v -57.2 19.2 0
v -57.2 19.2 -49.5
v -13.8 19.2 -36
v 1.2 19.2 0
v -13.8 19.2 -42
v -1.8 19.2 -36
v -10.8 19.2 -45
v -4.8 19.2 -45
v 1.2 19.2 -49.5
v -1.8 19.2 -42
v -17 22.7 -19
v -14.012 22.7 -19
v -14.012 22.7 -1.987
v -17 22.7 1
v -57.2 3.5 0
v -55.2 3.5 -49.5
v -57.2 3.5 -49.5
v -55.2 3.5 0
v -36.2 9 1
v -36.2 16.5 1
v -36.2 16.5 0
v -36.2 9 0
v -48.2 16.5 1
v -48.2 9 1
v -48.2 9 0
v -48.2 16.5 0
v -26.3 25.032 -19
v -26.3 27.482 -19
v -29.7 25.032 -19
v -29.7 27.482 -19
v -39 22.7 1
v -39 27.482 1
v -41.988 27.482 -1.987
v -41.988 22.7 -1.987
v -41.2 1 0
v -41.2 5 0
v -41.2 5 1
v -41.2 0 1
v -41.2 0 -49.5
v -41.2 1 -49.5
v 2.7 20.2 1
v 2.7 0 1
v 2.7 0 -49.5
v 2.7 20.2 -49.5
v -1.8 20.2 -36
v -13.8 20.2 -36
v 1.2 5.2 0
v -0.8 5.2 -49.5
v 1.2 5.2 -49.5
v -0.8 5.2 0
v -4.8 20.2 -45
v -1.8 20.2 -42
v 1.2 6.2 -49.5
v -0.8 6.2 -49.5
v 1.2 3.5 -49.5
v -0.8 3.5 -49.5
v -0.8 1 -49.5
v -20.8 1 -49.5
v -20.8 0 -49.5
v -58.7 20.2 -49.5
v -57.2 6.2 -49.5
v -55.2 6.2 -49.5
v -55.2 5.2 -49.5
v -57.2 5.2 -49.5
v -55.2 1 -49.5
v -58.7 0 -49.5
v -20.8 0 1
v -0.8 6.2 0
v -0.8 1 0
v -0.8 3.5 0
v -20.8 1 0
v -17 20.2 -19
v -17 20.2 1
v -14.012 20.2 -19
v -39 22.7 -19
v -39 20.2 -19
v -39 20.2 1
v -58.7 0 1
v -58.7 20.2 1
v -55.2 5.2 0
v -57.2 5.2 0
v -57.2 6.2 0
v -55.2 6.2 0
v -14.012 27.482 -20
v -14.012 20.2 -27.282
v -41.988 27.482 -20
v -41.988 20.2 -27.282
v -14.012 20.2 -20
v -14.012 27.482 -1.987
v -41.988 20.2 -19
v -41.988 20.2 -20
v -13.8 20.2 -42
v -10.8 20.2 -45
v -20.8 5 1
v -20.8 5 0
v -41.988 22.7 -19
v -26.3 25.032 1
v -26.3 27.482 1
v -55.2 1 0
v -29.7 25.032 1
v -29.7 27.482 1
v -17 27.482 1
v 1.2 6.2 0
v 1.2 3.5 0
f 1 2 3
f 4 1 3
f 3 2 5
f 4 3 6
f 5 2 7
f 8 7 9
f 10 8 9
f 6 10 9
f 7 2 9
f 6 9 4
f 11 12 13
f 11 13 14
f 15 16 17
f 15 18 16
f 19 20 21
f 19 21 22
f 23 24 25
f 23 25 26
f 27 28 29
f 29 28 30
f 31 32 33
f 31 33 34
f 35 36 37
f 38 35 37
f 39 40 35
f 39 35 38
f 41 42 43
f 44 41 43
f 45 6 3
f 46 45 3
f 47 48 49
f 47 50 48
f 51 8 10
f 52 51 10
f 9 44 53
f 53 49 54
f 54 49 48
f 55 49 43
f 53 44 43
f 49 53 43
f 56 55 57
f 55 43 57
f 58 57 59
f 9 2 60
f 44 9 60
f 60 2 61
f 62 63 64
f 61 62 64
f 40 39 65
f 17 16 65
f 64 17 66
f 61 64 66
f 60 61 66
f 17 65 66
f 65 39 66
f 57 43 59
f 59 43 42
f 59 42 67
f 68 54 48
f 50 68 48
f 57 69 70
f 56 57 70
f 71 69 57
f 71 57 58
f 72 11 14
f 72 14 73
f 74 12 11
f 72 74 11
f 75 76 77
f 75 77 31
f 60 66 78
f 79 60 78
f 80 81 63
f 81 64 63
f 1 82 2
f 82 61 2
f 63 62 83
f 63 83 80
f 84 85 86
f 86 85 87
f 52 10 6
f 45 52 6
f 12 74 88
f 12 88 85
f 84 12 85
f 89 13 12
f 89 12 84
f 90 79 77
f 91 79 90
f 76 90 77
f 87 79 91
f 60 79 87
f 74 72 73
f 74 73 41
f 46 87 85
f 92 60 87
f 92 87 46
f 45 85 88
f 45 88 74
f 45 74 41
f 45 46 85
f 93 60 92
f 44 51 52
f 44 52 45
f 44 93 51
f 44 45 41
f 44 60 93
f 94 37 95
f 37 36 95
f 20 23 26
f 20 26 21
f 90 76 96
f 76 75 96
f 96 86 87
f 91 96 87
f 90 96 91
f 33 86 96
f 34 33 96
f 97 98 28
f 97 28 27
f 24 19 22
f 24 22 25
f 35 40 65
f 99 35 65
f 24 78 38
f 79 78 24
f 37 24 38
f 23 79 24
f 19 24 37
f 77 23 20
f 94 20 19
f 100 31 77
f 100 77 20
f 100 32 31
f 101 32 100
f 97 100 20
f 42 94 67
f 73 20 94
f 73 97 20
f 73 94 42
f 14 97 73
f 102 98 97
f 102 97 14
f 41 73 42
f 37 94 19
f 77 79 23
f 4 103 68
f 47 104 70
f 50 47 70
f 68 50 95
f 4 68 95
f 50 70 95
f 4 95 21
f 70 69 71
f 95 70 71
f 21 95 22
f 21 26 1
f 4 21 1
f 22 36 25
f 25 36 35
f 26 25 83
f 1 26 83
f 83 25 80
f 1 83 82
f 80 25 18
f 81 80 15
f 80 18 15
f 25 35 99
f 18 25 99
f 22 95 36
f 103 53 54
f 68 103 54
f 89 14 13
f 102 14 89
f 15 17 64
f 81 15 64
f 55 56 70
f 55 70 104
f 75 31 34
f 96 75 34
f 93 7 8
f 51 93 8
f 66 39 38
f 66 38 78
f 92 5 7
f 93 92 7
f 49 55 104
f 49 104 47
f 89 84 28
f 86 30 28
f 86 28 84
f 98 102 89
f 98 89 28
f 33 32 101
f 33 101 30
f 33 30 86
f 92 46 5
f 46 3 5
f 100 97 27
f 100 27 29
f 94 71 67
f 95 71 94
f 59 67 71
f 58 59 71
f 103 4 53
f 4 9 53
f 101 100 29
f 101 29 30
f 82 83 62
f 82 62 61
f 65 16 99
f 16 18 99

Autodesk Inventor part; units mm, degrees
ref_plane "YZ Plane" through (0, 0, 0) normal (1, 0, 0) x (0, 1, 0)
ref_plane "XZ Plane" through (0, 0, 0) normal (0, 1, 0) x (-1, 0, 0)
ref_plane "XY Plane" through (0, 0, 0) normal (0, 0, 1) x (1, 0, 0)
sketch "Sketch1" plane through (0, 0, 0) normal (0, 1, 0) x (-1, 0, 0)
  line L0 (0, 0) -> (56, 0)
  line L1 (56, 0) -> (56, -50)
  line L2 (56, -50) -> (0, -50)
  line L3 (0, -50) -> (0, 0)
  line L4 (56.2, 0) -> (-0.2, 0)
  line L5 (-0.2, 0) -> (-0.2, -50)
  line L6 (-0.2, -50) -> (56.2, -50)
  line L7 (56.2, -50) -> (56.2, 0)
  line L8 (58.7, 2.5) -> (-2.7, 2.5)
  line L9 (-2.7, 2.5) -> (-2.7, -52.5)
  line L10 (-2.7, -52.5) -> (58.7, -52.5)
  line L11 (58.7, -52.5) -> (58.7, 2.5)
  line L12 (56.2, -48.0985) -> (56.2, -52.5)
  line L13 (-0.2, -48.7936) -> (-0.2, -52.5)
  point P0 (-0.2, -50)
  dimension "d0" = 56
  dimension "d1" = 50
  dimension "d2" = 0.2
  dimension "d3" = 0.2
  dimension "d4" = 0
  dimension "d5" = 0
  dimension "d6" = 2.5
  dimension "d7" = 2.5
  dimension "d8" = 2.5
  dimension "d9" = 2.5
extrude "Extrusion1" add sketch "Sketch1" along normal blind 15.2 contours L4 L5 L13 L10 L9 L8 L11 L12 L7 L0
extrude "Extrusion2" add sketch "Sketch1" along normal blind 1
sketch "Sketch2" plane through (0.2, 15.2, 0) normal (0, 0, -1) x (-1, 0, 0)
  line L0 (0, -14.2) -> (0, 0) projected
  line L1 (0, -11.7) -> (56.4, -11.7)
  line L2 (56.4, -11.7) -> (56.4, -14.2)
  line L3 (56.4, -14.2) -> (0, -14.2)
  line L4 (0, -14.2) -> (0, -11.7)
  line L5 (56.4, -14.2) -> (56.4, 0) projected
  line L6 (0, -14.2) -> (56.4, -14.2) projected
  line L7 (1, -11.7) -> (55.4, -11.7)
  line L8 (55.4, -11.7) -> (55.4, -14.2)
  line L9 (55.4, -14.2) -> (1, -14.2)
  line L10 (1, -14.2) -> (1, -11.7)
  line L11 (0, -9) -> (56.4, -9)
  line L12 (56.4, -9) -> (56.4, -10)
  line L13 (56.4, -10) -> (0, -10)
  line L14 (0, -10) -> (0, -9)
  line L15 (56.4, -9) -> (55.4, -9)
  line L16 (55.4, -9) -> (55.4, -10)
  line L17 (55.4, -10) -> (56.4, -10)
  line L18 (56.4, -10) -> (56.4, -9)
  line L19 (0, -9) -> (1, -9)
  line L20 (1, -9) -> (1, -10)
  line L21 (1, -10) -> (0, -10)
  line L22 (0, -10) -> (0, -9)
  point P0 (0.2, -15.2)
  point P1 (0, -10)
  point P2 (1, -14.2)
  dimension "d14" = 0
  dimension "d16" = 2.5
  dimension "d17" = 1
  dimension "d18" = 1
  dimension "d19" = 0
  dimension "d20" = 0
  dimension "d21" = 1.7
  dimension "d22" = 1
extrude "Extrusion3" add sketch "Sketch2" along normal up to surface (52.5 mm away) contours L0 L1 L10 L3 | L0 L11 L20 L13 | L8 L1 L2 L3 | L16 L11 L5 L13
sketch "Sketch3" plane through (2.7, 0, -52.5) normal (0, 0, -1) x (-1, 0, 0)
  line L0 (2.5, 15.2) -> (58.9, 15.2) projected
  line L1 (23.5, 15.2) -> (43.9, 15.2)
  line L2 (43.9, 15.2) -> (43.9, 0)
  line L3 (43.9, 0) -> (23.5, 0)
  line L4 (23.5, 0) -> (23.5, 15.2)
  line L5 (58.9, 6.2) -> (58.9, 15.2) projected
  line L6 (2.5, 6.2) -> (2.5, 15.2) projected
  line L7 (0, 0) -> (61.4, 0) projected
  line L8 (23.5, 0) -> (43.9, 0)
  line L9 (43.9, 0) -> (43.9, 5)
  line L10 (43.9, 5) -> (23.5, 5)
  line L11 (23.5, 5) -> (23.5, 0)
  point P0 (2.7, 0)
  dimension "d25" = 15
  dimension "d26" = 21
  dimension "d27" = 0
  dimension "d30" = 5
extrude "Extrusion5" cut sketch "Sketch3" against normal blind 75.725 contours L10 L2 L3 L4
sketch "Sketch4" plane through (-58.7, 15.2, 2.5) normal (0, 0, 1) x (1, 0, 0)
  line L0 (11.5, -0.7) -> (20.5, -0.7)
  line L1 (20.5, -0.7) -> (20.5, -4.2)
  line L2 (20.5, -4.2) -> (11.5, -4.2)
  line L3 (11.5, -4.2) -> (11.5, -0.7)
  point P0 (58.7, -15.2)
  point P1 (3.5, -11.7)
  point P2 (2.5, -11.7)
  dimension "d33" = 7.5
  dimension "d34" = 11
  dimension "d35" = 18
  dimension "d36" = 9
extrude "Extrusion6" cut sketch "Sketch4" against normal up to surface (2.5 mm away)
sketch "Sketch5" plane through (0, 15.2, 0) normal (0, 1, 0) x (1, 0, 0)
  line L0 (2.7, -2.5) -> (2.7, 52.5) projected
  line L1 (2.7, -2.5) -> (2.7, 52.5)
  line L2 (2.7, 52.5) -> (0.2, 52.5) projected
  line L3 (2.7, 52.5) -> (0.2, 52.5)
  line L4 (0.2, 52.5) -> (0.2, 0)
  line L5 (0.2, 0) -> (-56.2, 0) projected
  line L6 (0.2, 0) -> (-56.2, 0)
  line L7 (-56.2, 52.5) -> (-58.7, 52.5) projected
  line L8 (-56.2, 0) -> (-56.2, 52.5)
  line L9 (-58.7, 52.5) -> (-58.7, -2.5) projected
  line L10 (-56.2, 52.5) -> (-58.7, 52.5)
  line L11 (-58.7, -2.5) -> (2.7, -2.5) projected
  line L12 (-58.7, 52.5) -> (-58.7, -2.5)
  line L13 (-58.7, -2.5) -> (2.7, -2.5)
  point P0 (0, 0)
extrude "Extrusion7" add sketch "Sketch5" along normal blind 3
sketch "Sketch6" plane through (0, 18.2, 0) normal (0, 1, 0) x (1, 0, 0)
  line L0 (2.7, -2.5) -> (2.7, 52.5) projected
  line L1 (-58.7, 52.5) -> (-58.7, -2.5) projected
  line L2 (2.7, -2.5) -> (-58.7, -2.5)
  line L3 (-58.7, -2.5) -> (-58.7, 52.5)
  line L4 (-58.7, 52.5) -> (2.7, 52.5)
  line L5 (2.7, 52.5) -> (2.7, -2.5)
  line L6 (-13.8, 42) -> (-1.8, 42)
  line L7 (-1.8, 42) -> (-1.8, 36)
  line L8 (-1.8, 36) -> (-13.8, 36)
  line L9 (-13.8, 36) -> (-13.8, 42)
  line L10 (0.2, 0) -> (-56.2, 0) projected
  line L11 (0.2, 52.5) -> (0.2, 0) projected
  line L12 (-10.8, 45) -> (-4.8, 45)
  line L13 (-13.8, 42) -> (-8.427, 47.373)
  line L14 (-13.8, 42) -> (-6.2015, 42) construction
  line L15 (-1.8, 42) -> (-7.8, 48)
  line L16 (-1.8, 42) -> (6.6853, 42) construction
  point P0 (0, 0)
  point P1 (-4.8, 45)
  point P2 (-58.7, -2.5)
  dimension "d41" = 36
  dimension "d42" = 42
  dimension "d43" = 2
  dimension "d44" = 14
  dimension "d45" = 3
  dimension "d46" = 3
  dimension "d47" = 45
  dimension "d48" = 135
  dimension "d49" = 3
extrude "Extrusion8" add sketch "Sketch6" along normal blind 1
sketch "Sketch7" plane through (2.7, 0, -52.5) normal (0, 0, -1) x (-1, 0, 0)
  line L0 (2.5, 3.5) -> (2.5, 5.2) projected
  line L1 (2.5, 3.5) -> (1.5, 3.5)
  line L2 (1.5, 3.5) -> (1.5, 5.2)
  line L3 (1.5, 5.2) -> (2.5, 5.2)
  line L4 (2.5, 5.2) -> (2.5, 3.5)
  line L5 (2.5, 6.2) -> (2.5, 18.2) projected
  line L6 (2.5, 18.2) -> (1.5, 18.2)
  line L7 (1.5, 18.2) -> (1.5, 6.2)
  line L8 (1.5, 6.2) -> (2.5, 6.2)
  line L9 (2.5, 6.2) -> (2.5, 18.2)
  line L10 (58.9, 3.5) -> (58.9, 5.2) projected
  line L11 (58.9, 3.5) -> (59.9, 3.5)
  line L12 (59.9, 3.5) -> (59.9, 5.2)
  line L13 (59.9, 5.2) -> (58.9, 5.2)
  line L14 (58.9, 5.2) -> (58.9, 3.5)
  line L15 (57.9, 6.2) -> (58.9, 6.2) projected
  line L16 (58.9, 6.2) -> (59.9, 6.2)
  line L17 (59.9, 6.2) -> (59.9, 18.2)
  line L18 (59.9, 18.2) -> (58.9, 18.2)
  line L19 (58.9, 18.2) -> (58.9, 6.2)
  point P0 (2.7, 0)
  dimension "d52" = 1
  dimension "d53" = 1
  dimension "d54" = 1
  dimension "d55" = 1
extrude "Extrusion9" cut sketch "Sketch7" against normal up to surface (52.5 mm away)
sketch "Sketch8" plane through (0, 19.2, 0) normal (0, 1, 0) x (1, 0, 0)
  line L0 (2.7, 52.5) -> (-20.8, 52.5) projected
  line L1 (-58.7, 52.5) -> (-58.7, -2.5) projected
  line L2 (2.7, 52.5) -> (-58.7, 52.5)
  line L3 (-58.7, 52.5) -> (-58.7, 49.5)
  line L4 (-58.7, 49.5) -> (2.7, 49.5)
  line L5 (2.7, 49.5) -> (2.7, 52.5)
  point P0 (0, 0)
  dimension "d58" = 3
extrude "Extrusion10" cut sketch "Sketch8" against normal up to surface (19.2 mm away)
sketch "Sketch9" plane through (0, 19.2, 0) normal (0, 1, 0) x (1, 0, 0)
  line L0 (2.7, -2.5) -> (2.7, 49.5) projected
  line L1 (-58.7, 49.5) -> (-58.7, -2.5) projected
  line L2 (2.7, 49.5) -> (-58.7, 49.5)
  line L3 (-58.7, 49.5) -> (-58.7, -2.5)
  line L4 (-58.7, -2.5) -> (2.7, -2.5)
  line L5 (2.7, -2.5) -> (2.7, 49.5)
  line L6 (-1.8, 42) -> (-1.8, 36) projected
  line L7 (-4.8, 45) -> (-1.8, 42) projected
  line L8 (-1.8, 42) -> (-4.8, 45)
  line L9 (-10.8, 45) -> (-4.8, 45) projected
  line L10 (-4.8, 45) -> (-10.8, 45)
  line L11 (-13.8, 42) -> (-10.8, 45) projected
  line L12 (-10.8, 45) -> (-13.8, 42)
  line L13 (-13.8, 36) -> (-13.8, 42) projected
  line L14 (-13.8, 42) -> (-13.8, 36)
  line L15 (-1.8, 36) -> (-13.8, 36) projected
  line L16 (-13.8, 36) -> (-1.8, 36)
  line L17 (-1.8, 36) -> (-1.8, 42)
  point P0 (0, 0)
extrude "Extrusion11" add sketch "Sketch9" along normal blind 1
sketch "Sketch10" plane through (1.2, 18.2, -49.5) normal (0, 0, -1) x (-1, 0, 0)
  line L0 (0, 0) -> (58.4, 0) projected
  line L1 (0, 0) -> (58.4, 0)
  line L2 (58.4, 0) -> (58.4, 1)
  line L3 (58.4, 1) -> (0, 1)
  line L4 (0, 1) -> (0, 0)
  point P0 (1.2, -18.2)
  dimension "d63" = 1
extrude "Extrusion12" cut sketch "Sketch10" against normal up to surface (49.5 mm away)
sketch "Sketch11" plane through (0, 20.2, 0) normal (0, 1, 0) x (1, 0, 0)
  line L0 (2.7, -2.5) -> (2.7, 49.5) projected
  line L1 (-58.7, 49.5) -> (-58.7, -2.5) projected
  line L2 (2.7, -2.5) -> (-58.7, -2.5)
  line L3 (-58.7, -2.5) -> (-58.7, -1)
  line L4 (-58.7, -1) -> (2.7, -1)
  line L5 (2.7, -1) -> (2.7, -2.5)
  point P0 (0, 0)
  dimension "d66" = 1.5
extrude "Extrusion13" cut sketch "Sketch11" against normal blind 24.925
sketch "Sketch12" plane through (-58.7, 20.2, 1) normal (0, 0, 1) x (1, 0, 0)
  line L0 (10.5, -3.7) -> (22.5, -3.7)
  line L1 (22.5, -3.7) -> (22.5, -11.2)
  line L2 (22.5, -11.2) -> (10.5, -11.2)
  line L3 (10.5, -11.2) -> (10.5, -3.7)
  line L4 (20.5, -5.7) -> (11.5, -5.7) projected
  line L5 (20.5, -9.2) -> (20.5, -5.7) projected
  line L6 (11.5, -9.2) -> (20.5, -9.2) projected
  line L7 (11.5, -5.7) -> (11.5, -9.2) projected
  point P0 (58.7, -20.2)
  dimension "d69" = 2
  dimension "d70" = 2
  dimension "d71" = 2
  dimension "d73" = 1
extrude "Extrusion14" cut sketch "Sketch12" against normal up to surface (1 mm away)
sketch "Sketch13" plane through (-58.7, 20.2, 1) normal (0, 0, 1) x (1, 0, 0)
  line L0 (29, 2.5) -> (41.7, 2.5)
  line L1 (41.7, 2.5) -> (41.7, 0)
  line L2 (41.7, 0) -> (19.7, 0)
  line L3 (19.7, 0) -> (19.7, 2.5)
  line L4 (0, 0) -> (61.4, 0) projected
  line L5 (0, -20.2) -> (0, 0) projected
  line L6 (16.7125, 7.282) -> (44.6875, 7.282)
  line L7 (44.6875, 7.282) -> (44.6875, 2.5)
  line L8 (16.7125, 2.5) -> (16.7125, 7.282)
  line L9 (29, 7.282) -> (32.4, 7.282)
  line L10 (32.4, 7.282) -> (32.4, 4.832)
  line L11 (32.4, 4.832) -> (29, 4.832)
  line L12 (29, 4.832) -> (29, 7.282)
  line L13 (44.6875, 2.5) -> (41.7, 2.5)
  line L14 (19.7, 2.5) -> (16.7125, 2.5)
  point P0 (58.7, -20.2)
  dimension "d76" = 0
  dimension "d77" = 2.5
  dimension "d78" = 22
  dimension "d79" = 61.4
  dimension "d80" = 19.7
  dimension "d81" = 4.782
  dimension "d83" = 27.975
  dimension "d84" = 16.7125
  dimension "d85" = 2.45
  dimension "d86" = 3.4
  dimension "d87" = 0
  dimension "d88" = 29
extrude "Extrusion15" add sketch "Sketch13" against normal blind 20 contours L1 L2 L3 L14 L8 L6 L12 L11 L10 L7 L13
sketch "Sketch14" plane through (-58.7, 20.2, -19) normal (0, 0, -1) x (-1, 0, 0)
  line L0 (-44.6875, 2.5) -> (-44.6875, 7.282) projected
  line L1 (-44.6875, 7.282) -> (-16.7125, 7.282)
  line L2 (-16.7125, 7.282) -> (-16.7125, 0)
  line L3 (-16.7125, 0) -> (-44.6875, 0)
  line L4 (-44.6875, 0) -> (-44.6875, 7.282)
  line L5 (-61.4, 0) -> (0, 0) projected
  line L6 (-16.7125, 2.5) -> (-16.7125, 7.282) projected
  point P0 (-58.7, -20.2)
  dimension "d91" = 0
  dimension "d92" = 0
extrude "Extrusion16" add sketch "Sketch14" along normal blind 1
chamfer "Chamfer1" distance 2.987 angle 45 2 edges at (-41.9875, 25.091, 1) (-14.0125, 25.091, 1)
chamfer "Chamfer2" distance 7.282 angle 45 1 edges at (-28, 20.2, -20)
equation "\"d23\" = d16"
properties part number "case+gopro"
